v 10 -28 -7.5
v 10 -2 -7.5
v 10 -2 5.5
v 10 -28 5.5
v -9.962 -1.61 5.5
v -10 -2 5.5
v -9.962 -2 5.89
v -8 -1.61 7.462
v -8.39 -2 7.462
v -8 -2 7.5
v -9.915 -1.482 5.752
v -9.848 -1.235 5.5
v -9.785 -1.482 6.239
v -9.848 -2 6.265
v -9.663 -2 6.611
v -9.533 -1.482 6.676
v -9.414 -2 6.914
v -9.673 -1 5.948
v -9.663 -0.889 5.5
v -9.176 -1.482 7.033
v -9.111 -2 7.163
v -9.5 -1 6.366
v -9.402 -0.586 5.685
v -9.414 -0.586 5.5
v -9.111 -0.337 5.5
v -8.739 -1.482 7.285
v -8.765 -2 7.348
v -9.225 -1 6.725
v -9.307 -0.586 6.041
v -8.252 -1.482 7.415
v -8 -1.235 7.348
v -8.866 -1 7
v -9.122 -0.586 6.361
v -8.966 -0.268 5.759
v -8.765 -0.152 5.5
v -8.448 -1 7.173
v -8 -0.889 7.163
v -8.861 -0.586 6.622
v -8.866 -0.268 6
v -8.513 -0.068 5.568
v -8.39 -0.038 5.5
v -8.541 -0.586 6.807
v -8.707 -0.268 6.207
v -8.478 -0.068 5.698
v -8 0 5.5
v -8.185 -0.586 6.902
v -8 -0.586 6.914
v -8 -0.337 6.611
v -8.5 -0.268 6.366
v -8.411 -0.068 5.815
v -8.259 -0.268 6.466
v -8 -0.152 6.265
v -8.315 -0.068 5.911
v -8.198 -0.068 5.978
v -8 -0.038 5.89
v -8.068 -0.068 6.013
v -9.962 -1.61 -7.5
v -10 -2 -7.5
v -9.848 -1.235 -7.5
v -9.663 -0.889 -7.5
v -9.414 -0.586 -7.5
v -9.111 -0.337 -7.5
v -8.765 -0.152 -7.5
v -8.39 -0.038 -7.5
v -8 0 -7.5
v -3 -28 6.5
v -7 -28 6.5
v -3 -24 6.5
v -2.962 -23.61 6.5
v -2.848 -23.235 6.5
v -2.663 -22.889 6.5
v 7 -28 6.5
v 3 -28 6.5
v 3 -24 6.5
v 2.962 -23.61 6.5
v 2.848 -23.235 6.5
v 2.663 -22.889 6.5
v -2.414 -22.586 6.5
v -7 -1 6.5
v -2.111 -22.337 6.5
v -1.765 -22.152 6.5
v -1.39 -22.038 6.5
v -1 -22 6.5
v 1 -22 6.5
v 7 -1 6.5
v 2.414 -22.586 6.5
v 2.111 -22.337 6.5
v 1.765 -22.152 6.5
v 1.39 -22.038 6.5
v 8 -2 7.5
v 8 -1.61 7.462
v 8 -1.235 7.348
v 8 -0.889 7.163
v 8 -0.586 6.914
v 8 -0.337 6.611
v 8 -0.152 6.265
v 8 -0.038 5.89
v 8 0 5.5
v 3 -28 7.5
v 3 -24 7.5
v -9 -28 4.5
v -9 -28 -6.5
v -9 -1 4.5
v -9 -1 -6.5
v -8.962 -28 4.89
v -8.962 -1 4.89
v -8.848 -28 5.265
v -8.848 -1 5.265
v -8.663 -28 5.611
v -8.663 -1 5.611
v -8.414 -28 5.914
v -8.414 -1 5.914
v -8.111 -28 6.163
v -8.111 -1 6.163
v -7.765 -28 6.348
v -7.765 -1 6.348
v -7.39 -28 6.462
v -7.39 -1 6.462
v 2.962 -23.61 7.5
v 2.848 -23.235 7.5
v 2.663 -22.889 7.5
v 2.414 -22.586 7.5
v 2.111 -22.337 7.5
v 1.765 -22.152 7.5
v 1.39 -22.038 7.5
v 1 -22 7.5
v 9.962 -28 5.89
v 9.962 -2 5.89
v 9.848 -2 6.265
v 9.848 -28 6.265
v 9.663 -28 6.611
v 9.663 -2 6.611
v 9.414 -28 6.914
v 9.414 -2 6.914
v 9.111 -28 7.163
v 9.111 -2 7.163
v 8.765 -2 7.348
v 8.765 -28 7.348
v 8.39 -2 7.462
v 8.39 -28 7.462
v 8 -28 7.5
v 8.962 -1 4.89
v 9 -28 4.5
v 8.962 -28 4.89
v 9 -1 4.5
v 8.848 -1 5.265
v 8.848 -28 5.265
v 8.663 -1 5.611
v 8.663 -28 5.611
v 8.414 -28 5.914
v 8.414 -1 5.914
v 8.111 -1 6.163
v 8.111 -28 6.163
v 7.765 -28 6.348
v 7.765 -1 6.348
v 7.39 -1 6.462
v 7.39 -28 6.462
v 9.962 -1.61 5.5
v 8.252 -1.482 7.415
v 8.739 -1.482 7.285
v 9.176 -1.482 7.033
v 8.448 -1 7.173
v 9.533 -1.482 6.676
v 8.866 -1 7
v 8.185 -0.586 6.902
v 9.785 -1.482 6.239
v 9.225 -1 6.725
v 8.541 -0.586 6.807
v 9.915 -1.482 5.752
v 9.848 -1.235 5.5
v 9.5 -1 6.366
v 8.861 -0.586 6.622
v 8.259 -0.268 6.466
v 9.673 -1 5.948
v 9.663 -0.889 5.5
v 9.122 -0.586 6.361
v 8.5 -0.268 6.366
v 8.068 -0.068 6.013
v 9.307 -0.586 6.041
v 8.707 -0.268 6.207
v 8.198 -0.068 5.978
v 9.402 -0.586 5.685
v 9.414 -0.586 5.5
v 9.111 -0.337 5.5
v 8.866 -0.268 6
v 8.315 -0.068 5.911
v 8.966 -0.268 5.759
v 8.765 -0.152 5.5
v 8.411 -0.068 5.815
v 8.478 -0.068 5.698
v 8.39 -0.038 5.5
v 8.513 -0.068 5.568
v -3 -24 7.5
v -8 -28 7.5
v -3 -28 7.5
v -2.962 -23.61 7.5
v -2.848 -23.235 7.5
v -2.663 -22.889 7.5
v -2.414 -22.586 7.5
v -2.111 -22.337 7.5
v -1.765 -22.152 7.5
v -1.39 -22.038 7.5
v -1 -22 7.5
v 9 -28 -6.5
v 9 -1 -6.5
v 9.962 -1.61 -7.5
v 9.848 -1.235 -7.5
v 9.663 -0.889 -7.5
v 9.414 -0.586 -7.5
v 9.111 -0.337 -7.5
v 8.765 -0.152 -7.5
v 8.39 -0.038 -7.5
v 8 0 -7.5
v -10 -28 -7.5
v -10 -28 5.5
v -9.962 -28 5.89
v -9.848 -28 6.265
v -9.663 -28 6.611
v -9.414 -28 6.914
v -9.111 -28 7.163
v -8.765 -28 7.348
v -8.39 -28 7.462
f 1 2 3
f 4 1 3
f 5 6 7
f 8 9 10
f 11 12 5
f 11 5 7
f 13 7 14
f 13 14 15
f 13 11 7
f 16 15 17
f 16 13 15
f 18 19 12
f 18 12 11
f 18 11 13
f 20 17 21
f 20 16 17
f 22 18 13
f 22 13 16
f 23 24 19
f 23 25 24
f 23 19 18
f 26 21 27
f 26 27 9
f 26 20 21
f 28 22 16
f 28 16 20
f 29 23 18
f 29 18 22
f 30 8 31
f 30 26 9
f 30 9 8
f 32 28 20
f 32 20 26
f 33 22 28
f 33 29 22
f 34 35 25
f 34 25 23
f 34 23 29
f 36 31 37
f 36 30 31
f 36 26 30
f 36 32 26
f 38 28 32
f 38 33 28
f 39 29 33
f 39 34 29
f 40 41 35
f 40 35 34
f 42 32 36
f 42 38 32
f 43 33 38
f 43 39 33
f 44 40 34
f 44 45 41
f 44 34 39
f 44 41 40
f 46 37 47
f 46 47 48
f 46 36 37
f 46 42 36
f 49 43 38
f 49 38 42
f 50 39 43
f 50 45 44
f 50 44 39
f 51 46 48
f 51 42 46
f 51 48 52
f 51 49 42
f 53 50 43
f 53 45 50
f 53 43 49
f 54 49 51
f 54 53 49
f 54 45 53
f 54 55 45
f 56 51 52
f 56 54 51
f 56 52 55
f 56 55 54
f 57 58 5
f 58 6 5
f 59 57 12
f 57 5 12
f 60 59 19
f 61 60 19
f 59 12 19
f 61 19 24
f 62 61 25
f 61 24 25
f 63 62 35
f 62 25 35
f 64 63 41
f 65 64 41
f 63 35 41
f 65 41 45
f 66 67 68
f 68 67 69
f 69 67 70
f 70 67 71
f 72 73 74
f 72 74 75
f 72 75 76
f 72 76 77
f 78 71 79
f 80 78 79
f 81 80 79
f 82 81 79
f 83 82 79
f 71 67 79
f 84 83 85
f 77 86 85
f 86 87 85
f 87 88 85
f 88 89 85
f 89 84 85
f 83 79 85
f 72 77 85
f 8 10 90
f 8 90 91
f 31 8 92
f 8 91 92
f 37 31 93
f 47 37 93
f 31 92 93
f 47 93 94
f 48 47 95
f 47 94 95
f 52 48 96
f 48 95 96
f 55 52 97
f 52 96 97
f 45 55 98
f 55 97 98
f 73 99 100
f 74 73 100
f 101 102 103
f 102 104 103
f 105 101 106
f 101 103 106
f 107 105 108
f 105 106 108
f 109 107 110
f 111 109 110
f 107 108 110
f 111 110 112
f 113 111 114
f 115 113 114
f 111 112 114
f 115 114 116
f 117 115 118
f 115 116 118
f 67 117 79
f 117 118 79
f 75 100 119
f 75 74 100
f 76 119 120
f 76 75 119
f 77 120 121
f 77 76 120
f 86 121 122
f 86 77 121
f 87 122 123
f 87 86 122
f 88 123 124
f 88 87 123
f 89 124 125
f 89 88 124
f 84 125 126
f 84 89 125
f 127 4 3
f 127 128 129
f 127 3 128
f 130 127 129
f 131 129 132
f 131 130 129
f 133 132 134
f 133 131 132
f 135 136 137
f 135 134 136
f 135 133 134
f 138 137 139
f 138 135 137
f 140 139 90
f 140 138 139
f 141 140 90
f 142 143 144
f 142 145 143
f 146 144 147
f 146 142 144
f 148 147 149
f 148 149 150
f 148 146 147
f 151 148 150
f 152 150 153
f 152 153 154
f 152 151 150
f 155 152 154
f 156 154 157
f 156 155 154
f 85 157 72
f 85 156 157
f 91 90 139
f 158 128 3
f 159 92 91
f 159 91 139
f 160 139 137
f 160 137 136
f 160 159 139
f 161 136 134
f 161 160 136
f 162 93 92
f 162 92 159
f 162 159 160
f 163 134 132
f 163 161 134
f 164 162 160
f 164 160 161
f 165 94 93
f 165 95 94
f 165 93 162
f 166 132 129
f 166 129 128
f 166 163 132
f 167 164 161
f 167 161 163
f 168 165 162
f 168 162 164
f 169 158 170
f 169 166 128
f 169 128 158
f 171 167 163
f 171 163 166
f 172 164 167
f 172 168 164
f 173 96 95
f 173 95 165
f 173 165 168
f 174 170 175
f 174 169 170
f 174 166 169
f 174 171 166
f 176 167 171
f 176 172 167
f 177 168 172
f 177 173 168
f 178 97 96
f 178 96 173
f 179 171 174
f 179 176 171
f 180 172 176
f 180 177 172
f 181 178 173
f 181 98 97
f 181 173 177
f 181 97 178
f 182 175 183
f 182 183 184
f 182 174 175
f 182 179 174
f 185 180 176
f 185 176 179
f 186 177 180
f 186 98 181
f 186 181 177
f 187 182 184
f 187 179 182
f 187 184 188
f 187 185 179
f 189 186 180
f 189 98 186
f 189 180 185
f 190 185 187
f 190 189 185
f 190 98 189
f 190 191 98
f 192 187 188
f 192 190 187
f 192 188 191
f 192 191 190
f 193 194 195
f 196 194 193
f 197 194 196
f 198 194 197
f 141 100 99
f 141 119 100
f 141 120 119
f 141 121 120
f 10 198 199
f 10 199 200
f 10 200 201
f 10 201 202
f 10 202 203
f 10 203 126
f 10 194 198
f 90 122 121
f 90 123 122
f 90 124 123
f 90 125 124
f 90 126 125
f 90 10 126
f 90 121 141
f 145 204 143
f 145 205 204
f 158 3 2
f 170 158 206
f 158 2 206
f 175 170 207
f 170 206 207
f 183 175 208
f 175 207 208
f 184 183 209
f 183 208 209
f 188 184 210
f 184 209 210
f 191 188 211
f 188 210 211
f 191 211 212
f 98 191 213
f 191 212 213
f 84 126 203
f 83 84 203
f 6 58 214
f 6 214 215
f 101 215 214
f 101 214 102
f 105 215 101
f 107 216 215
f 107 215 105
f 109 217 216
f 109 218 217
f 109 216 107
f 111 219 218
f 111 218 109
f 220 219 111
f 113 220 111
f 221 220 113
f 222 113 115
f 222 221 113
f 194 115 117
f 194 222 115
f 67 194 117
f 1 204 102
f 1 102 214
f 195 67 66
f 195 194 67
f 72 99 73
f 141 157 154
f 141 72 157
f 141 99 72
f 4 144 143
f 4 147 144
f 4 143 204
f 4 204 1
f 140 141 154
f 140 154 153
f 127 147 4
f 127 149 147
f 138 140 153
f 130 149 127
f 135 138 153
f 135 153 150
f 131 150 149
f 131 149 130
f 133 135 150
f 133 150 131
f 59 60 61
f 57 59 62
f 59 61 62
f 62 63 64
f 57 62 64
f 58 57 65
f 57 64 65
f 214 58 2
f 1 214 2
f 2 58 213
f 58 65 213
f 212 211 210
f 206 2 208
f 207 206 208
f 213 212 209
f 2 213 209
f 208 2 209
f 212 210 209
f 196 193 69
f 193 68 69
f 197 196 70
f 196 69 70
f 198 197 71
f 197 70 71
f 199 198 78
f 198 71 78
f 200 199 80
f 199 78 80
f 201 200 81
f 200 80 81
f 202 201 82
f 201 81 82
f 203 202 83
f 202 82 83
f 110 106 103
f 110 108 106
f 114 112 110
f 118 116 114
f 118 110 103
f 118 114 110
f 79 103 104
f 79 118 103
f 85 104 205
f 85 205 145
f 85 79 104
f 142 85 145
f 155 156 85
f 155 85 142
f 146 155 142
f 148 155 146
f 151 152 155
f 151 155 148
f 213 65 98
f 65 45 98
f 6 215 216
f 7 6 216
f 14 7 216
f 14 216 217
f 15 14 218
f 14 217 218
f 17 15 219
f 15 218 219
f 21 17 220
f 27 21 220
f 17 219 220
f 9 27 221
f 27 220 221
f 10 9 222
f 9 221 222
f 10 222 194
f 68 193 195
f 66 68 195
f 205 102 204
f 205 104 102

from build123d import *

# Parameters (mm, degrees)
F0_W     = 20
F0_H     = 15
F1_DEPTH = 28
F2_T     = -1
F3_R     = 2
F4_R     = 2
F5_R     = 2
F7_DEPTH = 1
F8_R     = 2


with BuildPart() as f1:
    # F0 (on Front) → F1 (new body)
    with BuildSketch(Plane.XZ):
        Rectangle(F0_W, F0_H)
    extrude(amount=F1_DEPTH)

    # F2
    f2_openings = [f1.faces().sort_by_distance(p)[0] for p in [
        (0, -28, 0),
    ]]
    offset(amount=F2_T, openings=f2_openings)

    # F3
    f3_edges = [f1.edges().sort_by_distance(p)[0] for p in [
        (-9, -14.5, 6.5),
        (9, -14.5, 6.5),
    ]]
    fillet(f3_edges, radius=F3_R)

    # F4
    f4_edges = [f1.edges().sort_by_distance(p)[0] for p in [
        (10, -14, 7.5),
        (-10, -14, 7.5),
    ]]
    fillet(f4_edges, radius=F4_R)

    # F5
    f5_edges = [f1.edges().sort_by_distance(p)[0] for p in [
        (0, 0, 7.5),
        (10, 0, -1),
        (-10, 0, -1),
    ]]
    fillet(f5_edges, radius=F5_R)

    # F6 (on face) → F7 (cut, through all)
    with BuildSketch(Plane.XY.offset(7.5)):
        Polygon((3, -28), (3, -22), (-3, -22), (-3, -28), (0, -28), align=None)
    extrude(amount=-F7_DEPTH, mode=Mode.SUBTRACT)

    # F8
    f8_edges = [f1.edges().sort_by_distance(p)[0] for p in [
        (-3, -22, 7),
        (3, -22, 7),
    ]]
    fillet(f8_edges, radius=F8_R)


solid = f1.part
